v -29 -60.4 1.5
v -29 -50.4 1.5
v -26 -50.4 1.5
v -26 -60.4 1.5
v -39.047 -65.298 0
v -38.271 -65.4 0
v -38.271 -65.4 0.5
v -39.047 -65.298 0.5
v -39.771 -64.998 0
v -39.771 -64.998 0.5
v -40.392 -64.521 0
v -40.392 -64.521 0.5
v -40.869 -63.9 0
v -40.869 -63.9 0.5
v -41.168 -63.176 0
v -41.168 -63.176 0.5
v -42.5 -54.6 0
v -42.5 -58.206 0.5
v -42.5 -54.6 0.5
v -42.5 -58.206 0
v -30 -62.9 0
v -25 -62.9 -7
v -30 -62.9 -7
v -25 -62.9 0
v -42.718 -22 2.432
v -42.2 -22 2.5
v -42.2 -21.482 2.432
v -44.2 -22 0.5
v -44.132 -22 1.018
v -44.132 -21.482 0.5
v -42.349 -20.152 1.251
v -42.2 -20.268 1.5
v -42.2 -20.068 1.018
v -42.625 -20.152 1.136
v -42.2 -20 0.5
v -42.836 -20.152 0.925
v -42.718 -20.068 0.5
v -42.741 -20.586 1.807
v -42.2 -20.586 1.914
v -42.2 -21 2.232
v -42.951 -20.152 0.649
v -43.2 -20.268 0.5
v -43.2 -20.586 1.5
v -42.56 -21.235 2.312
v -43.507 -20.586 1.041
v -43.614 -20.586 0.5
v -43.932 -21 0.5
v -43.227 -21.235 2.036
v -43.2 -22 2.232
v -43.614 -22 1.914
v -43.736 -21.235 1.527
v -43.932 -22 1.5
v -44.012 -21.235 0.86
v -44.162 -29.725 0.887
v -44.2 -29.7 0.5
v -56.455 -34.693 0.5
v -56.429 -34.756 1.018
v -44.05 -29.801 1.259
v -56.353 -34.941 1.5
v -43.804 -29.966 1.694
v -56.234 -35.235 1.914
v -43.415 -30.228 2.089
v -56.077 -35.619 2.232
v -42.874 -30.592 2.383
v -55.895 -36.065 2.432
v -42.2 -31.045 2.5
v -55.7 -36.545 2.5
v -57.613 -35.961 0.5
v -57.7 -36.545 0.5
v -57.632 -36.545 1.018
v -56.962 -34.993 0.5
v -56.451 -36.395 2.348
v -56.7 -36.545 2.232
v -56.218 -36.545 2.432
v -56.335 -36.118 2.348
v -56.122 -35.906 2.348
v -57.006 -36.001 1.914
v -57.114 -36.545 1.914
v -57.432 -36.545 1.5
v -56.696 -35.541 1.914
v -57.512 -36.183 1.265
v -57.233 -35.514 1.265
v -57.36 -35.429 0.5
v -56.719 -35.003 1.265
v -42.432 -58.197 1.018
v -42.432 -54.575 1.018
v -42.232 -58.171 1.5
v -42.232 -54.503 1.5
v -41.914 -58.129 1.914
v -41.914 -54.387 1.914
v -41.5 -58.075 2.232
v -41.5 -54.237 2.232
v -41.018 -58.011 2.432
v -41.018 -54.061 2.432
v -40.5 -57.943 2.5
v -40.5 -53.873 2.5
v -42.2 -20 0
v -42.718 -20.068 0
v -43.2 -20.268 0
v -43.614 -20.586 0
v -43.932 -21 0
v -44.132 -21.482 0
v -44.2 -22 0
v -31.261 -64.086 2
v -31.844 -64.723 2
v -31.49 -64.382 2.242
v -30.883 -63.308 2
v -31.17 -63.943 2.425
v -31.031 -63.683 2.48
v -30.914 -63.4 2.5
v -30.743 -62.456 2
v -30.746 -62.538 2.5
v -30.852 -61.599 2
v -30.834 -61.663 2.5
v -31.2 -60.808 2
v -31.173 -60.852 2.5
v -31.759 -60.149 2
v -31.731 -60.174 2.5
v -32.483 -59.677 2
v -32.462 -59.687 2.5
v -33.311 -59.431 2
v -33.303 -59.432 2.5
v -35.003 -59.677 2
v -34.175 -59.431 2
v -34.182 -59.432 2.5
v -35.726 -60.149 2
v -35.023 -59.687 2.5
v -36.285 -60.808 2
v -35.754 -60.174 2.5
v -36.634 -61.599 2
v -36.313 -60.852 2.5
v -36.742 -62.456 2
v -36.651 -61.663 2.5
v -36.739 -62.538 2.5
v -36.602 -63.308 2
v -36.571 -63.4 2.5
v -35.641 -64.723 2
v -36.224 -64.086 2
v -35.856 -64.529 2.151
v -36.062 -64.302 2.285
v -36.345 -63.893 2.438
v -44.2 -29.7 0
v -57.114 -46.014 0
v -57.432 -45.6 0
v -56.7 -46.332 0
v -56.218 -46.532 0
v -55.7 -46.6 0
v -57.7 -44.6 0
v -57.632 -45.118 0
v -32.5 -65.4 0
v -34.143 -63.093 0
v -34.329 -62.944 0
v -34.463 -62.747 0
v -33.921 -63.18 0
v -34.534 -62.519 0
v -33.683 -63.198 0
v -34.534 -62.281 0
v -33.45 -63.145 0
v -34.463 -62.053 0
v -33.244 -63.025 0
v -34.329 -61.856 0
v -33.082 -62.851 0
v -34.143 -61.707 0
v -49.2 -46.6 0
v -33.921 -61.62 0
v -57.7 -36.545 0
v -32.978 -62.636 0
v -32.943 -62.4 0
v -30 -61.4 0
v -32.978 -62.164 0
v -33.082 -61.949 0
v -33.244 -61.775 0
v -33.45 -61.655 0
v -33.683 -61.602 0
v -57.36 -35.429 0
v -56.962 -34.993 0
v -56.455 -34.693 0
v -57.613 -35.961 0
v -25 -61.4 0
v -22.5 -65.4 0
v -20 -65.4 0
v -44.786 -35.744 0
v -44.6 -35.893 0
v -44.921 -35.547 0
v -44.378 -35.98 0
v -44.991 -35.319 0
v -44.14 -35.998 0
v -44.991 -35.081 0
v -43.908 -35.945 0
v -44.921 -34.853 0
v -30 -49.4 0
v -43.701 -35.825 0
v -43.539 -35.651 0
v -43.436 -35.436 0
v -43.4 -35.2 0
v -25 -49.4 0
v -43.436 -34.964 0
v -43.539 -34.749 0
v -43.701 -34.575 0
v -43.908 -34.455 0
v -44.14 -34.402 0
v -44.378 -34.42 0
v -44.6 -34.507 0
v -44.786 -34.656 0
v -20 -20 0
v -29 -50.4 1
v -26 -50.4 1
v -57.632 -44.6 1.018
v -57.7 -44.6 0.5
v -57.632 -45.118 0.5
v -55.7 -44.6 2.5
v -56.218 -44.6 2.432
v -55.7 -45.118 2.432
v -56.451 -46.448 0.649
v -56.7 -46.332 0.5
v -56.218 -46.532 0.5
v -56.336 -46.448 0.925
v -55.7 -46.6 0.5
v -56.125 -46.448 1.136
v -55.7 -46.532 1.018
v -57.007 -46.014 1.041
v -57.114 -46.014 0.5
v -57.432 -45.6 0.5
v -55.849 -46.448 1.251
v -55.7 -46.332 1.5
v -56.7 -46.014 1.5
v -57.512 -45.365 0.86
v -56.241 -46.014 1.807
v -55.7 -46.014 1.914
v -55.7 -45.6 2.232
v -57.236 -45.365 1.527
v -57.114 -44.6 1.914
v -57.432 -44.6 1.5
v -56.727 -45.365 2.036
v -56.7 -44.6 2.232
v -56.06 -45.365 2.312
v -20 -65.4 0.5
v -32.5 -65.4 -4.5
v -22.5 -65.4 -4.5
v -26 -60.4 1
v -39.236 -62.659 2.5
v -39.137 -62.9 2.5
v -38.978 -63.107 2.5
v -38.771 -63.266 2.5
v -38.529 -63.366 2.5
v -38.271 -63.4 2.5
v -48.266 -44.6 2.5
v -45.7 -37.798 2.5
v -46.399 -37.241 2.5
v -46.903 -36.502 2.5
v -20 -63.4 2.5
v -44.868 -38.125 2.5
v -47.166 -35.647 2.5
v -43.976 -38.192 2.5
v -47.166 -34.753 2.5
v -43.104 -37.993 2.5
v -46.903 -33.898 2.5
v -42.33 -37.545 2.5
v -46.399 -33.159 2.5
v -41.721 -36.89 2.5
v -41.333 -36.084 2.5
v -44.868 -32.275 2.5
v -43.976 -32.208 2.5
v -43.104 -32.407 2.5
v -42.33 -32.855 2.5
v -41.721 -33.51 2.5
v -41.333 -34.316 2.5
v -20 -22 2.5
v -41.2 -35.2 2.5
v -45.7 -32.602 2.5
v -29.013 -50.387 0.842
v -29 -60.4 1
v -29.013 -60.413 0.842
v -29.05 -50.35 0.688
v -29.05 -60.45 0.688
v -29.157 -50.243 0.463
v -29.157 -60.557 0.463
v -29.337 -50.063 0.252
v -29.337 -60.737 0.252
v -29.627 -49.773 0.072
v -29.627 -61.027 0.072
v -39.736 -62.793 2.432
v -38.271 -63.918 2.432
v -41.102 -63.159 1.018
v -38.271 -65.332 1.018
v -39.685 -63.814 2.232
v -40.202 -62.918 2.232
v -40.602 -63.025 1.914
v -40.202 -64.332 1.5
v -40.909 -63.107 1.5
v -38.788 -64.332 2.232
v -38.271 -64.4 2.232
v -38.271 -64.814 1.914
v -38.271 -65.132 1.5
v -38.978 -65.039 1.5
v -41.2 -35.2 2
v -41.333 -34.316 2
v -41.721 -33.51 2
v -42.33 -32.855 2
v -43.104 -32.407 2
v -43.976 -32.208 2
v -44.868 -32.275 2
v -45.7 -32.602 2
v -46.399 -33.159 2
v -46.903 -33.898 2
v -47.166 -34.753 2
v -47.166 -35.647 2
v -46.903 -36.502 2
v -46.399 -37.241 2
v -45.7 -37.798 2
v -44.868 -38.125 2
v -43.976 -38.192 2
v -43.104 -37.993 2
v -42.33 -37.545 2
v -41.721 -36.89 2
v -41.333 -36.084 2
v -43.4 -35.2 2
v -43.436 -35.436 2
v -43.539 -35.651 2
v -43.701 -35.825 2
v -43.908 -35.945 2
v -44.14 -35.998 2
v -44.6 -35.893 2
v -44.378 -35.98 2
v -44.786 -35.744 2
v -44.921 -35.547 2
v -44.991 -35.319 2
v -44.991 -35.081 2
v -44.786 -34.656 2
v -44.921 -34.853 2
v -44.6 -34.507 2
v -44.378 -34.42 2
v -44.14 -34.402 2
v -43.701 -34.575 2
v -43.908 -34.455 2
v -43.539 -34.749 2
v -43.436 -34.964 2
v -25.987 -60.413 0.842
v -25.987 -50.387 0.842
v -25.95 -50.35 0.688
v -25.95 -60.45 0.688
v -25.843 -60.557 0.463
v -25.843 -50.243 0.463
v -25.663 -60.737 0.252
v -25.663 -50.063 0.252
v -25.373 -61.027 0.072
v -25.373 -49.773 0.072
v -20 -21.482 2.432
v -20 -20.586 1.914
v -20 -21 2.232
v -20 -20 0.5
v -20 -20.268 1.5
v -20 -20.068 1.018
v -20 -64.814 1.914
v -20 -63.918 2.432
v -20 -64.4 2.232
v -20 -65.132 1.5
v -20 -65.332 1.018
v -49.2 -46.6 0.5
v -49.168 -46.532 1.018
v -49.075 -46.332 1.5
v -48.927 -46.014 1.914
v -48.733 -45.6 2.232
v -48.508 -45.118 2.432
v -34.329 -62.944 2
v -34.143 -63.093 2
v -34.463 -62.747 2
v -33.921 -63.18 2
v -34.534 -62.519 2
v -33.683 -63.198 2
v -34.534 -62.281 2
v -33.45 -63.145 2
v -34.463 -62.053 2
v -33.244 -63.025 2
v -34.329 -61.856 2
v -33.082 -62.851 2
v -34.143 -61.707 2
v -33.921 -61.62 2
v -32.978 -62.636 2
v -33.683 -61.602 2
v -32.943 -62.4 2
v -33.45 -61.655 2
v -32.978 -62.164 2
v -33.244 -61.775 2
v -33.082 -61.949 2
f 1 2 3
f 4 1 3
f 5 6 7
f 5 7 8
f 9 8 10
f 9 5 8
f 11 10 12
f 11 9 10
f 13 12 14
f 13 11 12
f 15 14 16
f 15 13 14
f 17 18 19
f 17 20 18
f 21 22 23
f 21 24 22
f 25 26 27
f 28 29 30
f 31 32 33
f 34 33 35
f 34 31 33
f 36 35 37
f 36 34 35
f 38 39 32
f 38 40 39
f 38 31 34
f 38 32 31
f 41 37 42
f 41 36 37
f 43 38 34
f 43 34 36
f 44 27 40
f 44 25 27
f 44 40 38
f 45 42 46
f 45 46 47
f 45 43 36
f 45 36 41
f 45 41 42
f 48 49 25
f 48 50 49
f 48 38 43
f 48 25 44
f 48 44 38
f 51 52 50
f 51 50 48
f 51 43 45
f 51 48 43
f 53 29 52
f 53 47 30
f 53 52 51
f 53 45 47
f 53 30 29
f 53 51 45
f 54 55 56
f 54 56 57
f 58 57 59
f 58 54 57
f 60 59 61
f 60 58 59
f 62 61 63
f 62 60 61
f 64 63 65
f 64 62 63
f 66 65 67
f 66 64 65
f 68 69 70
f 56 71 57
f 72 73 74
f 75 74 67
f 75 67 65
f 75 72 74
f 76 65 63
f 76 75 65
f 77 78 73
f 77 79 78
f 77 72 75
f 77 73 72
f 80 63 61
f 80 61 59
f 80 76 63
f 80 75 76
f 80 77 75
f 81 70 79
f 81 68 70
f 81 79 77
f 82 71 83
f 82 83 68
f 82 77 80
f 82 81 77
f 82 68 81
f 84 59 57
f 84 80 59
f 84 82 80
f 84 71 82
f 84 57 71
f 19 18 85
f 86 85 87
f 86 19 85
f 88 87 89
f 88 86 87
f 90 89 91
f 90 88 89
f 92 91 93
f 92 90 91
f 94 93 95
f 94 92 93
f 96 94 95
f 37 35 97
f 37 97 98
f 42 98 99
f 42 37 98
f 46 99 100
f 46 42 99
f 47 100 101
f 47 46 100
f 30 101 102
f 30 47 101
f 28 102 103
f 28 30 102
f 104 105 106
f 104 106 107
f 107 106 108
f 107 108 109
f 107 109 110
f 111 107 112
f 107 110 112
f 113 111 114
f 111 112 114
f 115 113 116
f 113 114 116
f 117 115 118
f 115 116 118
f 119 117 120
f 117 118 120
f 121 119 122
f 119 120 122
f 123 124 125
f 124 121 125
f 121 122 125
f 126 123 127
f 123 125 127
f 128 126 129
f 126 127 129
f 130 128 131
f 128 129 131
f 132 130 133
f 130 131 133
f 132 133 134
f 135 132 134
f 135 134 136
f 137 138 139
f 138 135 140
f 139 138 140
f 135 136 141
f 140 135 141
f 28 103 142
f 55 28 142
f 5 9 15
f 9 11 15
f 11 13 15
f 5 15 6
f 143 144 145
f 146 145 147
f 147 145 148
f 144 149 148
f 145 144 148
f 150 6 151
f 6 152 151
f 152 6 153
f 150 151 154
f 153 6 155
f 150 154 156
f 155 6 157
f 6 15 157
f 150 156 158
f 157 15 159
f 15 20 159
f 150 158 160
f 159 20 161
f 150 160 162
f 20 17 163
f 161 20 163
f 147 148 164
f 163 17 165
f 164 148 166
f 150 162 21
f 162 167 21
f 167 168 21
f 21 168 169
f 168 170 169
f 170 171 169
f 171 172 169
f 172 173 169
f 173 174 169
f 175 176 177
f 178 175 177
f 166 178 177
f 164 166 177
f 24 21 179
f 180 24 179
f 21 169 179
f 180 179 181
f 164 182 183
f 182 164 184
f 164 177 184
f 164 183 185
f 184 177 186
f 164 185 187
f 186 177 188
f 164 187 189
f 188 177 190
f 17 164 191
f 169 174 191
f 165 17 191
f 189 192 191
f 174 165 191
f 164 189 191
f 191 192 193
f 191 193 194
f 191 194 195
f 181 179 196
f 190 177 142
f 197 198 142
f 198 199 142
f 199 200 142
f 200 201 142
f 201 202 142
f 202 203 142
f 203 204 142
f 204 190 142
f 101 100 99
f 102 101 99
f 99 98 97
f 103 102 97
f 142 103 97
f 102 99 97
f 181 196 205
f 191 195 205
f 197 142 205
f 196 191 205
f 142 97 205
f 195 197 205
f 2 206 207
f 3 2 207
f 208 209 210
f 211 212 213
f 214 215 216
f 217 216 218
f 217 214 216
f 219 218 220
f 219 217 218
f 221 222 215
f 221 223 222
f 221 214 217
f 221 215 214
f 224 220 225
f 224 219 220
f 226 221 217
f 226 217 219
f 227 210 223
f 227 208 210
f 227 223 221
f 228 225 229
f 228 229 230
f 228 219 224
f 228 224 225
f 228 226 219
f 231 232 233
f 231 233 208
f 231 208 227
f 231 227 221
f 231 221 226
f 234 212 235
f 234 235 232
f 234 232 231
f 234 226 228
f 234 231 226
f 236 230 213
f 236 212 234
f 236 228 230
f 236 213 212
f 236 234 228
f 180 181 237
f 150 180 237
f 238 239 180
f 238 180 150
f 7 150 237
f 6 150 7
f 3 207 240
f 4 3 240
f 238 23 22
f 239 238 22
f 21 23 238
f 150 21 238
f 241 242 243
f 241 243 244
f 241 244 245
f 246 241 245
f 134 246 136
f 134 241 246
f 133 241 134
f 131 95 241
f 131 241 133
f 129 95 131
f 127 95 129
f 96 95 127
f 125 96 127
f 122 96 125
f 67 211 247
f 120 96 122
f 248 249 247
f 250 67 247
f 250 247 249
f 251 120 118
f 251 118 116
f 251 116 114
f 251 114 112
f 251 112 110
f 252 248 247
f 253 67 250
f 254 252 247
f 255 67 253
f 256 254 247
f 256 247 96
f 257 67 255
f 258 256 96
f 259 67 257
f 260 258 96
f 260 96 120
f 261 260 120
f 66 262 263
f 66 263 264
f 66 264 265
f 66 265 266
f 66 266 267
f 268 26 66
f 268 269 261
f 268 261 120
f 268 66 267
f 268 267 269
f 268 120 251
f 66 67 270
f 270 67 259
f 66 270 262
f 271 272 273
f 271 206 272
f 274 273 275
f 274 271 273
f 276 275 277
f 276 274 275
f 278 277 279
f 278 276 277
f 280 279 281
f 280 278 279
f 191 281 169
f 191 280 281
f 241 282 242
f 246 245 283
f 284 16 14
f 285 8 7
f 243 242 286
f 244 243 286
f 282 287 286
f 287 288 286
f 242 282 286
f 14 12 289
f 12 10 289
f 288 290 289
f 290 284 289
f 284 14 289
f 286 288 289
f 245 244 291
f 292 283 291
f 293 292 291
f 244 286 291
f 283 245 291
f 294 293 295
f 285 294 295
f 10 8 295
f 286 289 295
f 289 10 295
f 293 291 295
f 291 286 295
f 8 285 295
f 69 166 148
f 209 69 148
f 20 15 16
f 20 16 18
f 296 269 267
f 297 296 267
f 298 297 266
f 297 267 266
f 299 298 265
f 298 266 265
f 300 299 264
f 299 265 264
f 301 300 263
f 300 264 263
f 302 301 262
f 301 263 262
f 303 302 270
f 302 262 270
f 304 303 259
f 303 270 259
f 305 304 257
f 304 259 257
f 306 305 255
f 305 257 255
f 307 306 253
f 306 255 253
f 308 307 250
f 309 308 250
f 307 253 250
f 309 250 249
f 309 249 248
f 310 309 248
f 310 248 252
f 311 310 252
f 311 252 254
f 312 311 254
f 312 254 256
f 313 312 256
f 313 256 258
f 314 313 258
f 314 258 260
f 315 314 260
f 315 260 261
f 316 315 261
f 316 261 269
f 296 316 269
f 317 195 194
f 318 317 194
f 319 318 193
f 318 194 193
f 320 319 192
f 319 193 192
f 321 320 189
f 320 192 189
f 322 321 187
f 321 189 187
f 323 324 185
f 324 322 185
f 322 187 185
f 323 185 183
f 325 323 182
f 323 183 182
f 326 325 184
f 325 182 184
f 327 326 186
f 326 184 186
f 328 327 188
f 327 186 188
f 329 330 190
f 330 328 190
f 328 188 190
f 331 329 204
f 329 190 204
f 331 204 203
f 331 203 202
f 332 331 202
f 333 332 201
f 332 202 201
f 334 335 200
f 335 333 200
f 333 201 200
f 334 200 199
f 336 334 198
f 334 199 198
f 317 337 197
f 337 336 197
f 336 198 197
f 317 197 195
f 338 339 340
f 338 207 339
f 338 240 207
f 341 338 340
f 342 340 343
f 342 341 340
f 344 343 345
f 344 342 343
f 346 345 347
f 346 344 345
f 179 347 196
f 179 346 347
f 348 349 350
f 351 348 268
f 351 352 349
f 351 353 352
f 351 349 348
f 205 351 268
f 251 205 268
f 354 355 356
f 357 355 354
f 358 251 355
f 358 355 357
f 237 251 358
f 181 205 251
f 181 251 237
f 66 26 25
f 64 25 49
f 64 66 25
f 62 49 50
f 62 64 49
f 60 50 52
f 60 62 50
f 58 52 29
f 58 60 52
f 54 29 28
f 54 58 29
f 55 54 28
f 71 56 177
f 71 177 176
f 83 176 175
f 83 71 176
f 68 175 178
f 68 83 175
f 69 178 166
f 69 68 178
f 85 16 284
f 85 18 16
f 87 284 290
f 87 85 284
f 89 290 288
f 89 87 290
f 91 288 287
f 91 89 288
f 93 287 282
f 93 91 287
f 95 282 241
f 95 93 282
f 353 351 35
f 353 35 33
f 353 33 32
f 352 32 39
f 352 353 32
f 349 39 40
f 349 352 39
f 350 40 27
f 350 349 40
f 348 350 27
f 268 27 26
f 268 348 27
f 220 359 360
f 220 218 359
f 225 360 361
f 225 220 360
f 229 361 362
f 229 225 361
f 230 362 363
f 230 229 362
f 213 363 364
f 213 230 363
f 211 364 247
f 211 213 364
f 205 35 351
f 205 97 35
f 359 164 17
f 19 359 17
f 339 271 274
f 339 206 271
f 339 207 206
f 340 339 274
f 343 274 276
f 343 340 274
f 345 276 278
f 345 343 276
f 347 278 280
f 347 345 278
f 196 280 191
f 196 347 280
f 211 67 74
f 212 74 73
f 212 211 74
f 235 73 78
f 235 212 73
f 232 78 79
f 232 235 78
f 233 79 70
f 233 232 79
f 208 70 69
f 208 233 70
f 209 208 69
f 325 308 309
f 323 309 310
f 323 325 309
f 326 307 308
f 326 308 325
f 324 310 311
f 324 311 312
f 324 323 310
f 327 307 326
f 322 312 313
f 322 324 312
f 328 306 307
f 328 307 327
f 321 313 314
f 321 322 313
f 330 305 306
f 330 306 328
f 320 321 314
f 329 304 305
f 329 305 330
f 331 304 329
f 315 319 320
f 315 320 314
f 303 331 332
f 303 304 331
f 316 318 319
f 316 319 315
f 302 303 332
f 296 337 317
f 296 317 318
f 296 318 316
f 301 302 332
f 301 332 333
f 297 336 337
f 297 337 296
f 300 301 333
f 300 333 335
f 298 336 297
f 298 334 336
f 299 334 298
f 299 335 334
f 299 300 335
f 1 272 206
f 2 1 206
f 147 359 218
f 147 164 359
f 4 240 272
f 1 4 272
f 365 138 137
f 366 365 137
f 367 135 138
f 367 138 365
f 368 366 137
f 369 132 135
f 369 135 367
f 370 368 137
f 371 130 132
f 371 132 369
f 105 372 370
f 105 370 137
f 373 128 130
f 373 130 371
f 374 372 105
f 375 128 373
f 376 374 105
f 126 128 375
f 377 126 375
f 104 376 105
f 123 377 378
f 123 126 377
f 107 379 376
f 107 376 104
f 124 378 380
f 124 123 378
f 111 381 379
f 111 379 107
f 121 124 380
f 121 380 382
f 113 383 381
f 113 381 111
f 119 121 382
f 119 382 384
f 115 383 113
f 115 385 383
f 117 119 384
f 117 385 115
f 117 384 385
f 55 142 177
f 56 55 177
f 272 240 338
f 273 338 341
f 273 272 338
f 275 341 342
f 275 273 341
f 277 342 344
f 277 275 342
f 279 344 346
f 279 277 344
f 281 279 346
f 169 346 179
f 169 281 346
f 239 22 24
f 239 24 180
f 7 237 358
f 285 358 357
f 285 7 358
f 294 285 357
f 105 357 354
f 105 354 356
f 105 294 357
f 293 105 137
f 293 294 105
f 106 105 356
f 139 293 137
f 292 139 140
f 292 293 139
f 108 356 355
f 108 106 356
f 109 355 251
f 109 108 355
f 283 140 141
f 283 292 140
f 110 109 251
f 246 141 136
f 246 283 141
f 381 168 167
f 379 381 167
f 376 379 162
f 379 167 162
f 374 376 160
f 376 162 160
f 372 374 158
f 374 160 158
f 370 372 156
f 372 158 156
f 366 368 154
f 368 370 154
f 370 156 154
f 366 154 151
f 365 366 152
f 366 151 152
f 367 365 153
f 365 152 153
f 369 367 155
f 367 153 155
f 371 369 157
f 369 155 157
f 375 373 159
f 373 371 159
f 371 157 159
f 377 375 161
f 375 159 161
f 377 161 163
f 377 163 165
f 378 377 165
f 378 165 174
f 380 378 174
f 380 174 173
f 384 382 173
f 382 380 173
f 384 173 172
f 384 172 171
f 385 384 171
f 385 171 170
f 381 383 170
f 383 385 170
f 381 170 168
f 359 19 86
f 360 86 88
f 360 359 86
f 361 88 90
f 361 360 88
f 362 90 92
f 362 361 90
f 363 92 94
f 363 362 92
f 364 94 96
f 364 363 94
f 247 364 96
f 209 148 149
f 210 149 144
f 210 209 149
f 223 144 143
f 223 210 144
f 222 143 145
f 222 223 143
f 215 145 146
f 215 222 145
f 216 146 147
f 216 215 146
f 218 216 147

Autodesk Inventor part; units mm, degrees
ref_plane "YZ Plane" through (0, 0, 0) normal (1, 0, 0) x (0, 1, 0)
ref_plane "XZ Plane" through (0, 0, 0) normal (0, 1, 0) x (-1, 0, 0)
ref_plane "XY Plane" through (0, 0, 0) normal (0, 0, 1) x (1, 0, 0)
sketch "Эскиз1" plane through (0, 0, 0) normal (0, 0, 1) x (1, 0, 0)
  line L0 (-41.7, -37.7) -> (-41.7, -22.5)
  line L1 (-41.7, -22.5) -> (-37.5, -22.5)
  line L2 (-37.5, -22.5) -> (-37.5, -24.2)
  line L3 (-37.5, -24.2) -> (-27.2, -24.2)
  line L4 (-27.2, -24.2) -> (-27.2, -22.5)
  line L5 (-27.2, -22.5) -> (-25, -22.5)
  line L6 (-25, -22.5) -> (-25, -24.2)
  line L7 (-25, -24.2) -> (-22.5, -24.2)
  line L8 (-22.5, -24.2) -> (-22.5, -61.2)
  line L9 (-22.5, -61.2) -> (-25, -61.2)
  line L10 (-25, -61.2) -> (-25, -62.9)
  line L11 (-25, -62.9) -> (-40, -62.9)
  line L12 (-40, -62.9) -> (-40, -55.0851)
  line L13 (-44.2, -20) -> (-20, -20)
  line L14 (-20, -20) -> (-20, -65.4)
  line L15 (-60, -70) -> (-20, -70)
  line L16 (-20, -65.4) -> (-42.5, -65.4)
  line L17 (-41.7, -37.7) -> (-55.2, -37.7)
  line L18 (-44.2, -20) -> (-44.2, -29.7)
  line L19 (-55.2, -37.7) -> (-55.2, -44.1)
  line L20 (-44.2, -29.7) -> (-57.7, -35.2)
  line L21 (-57.7, -35.2) -> (-57.7, -46.6)
  line L22 (-60, -20) -> (-60, -70)
  line L23 (-42.5, -65.4) -> (-42.5, -54.6)
  line L24 (-55.2, -44.1) -> (-53.2, -44.1)
  line L25 (-53.2, -44.1) -> (-53.2, -46.6)
  line L26 (-53.2, -46.6) -> (-57.7, -46.6)
  line L27 (-49.2, -44.1) -> (-49.2, -46.6)
  line L28 (-49.2, -46.6) -> (-42.5, -54.6)
  line L29 (-49.2, -44.1) -> (-40, -55.0851)
  line L30 (-49.2, -44.1) -> (-46.2, -44.1)
  line L31 (-46.2, -44.1) -> (-46.2, -47.6821)
  line L32 (-25, -62.9) -> (-22.5, -65.4)
  line L33 (-30, -62.9) -> (-32.5, -65.4)
  line L34 (-46.2, -44.1) -> (-46.2, -37.7)
  line L35 (-20, -70) -> (-20, -20)
  line L36 (-20, -20) -> (-60, -20)
  line L37 (-53.2, -46.6) -> (-49.2, -46.6)
  line L38 (-53.2, -44.1) -> (-55.7, -46.6)
  line L39 (-49.2, -44.1) -> (-46.7, -49.5851)
  circle A0 centre (-54.1298, -30.506) radius 0.8
  circle A1 centre (-54.1298, -30.506) radius 3
  line L40 (-55.7762, -34.4162) -> (-56.908, -31.6379)
  line L41 (-50.2196, -32.1524) -> (-51.3515, -29.3742)
  circle A2 centre (-33.7426, -62.4) radius 0.8
  circle A3 centre (-33.7426, -62.4) radius 3
  line L42 (-29, -50.4) -> (-26, -50.4)
  line L43 (-26, -50.4) -> (-26, -60.4)
  line L44 (-26, -60.4) -> (-29, -60.4)
  line L45 (-29, -60.4) -> (-29, -50.4)
  circle A4 centre (-44.2, -35.2) radius 0.8
  circle A5 centre (-44.2, -35.2) radius 3
  line L46 (-40.5725, -65.4) -> (-42.5, -58.2063)
  point P0 (0, 0)
  point P1 (-44.2, -20)
  point P2 (-42.5417, -37.7)
  point P3 (-41.7, -36.8583)
  point P4 (-41.7, -33.5417)
  point P5 (-45.8583, -37.7)
  dimension "d0" = 16.7
  dimension "d1" = 4.2
  dimension "d2" = 2.2
  dimension "d3" = 1.7
  dimension "d4" = 40.4
  dimension "d5" = 1.7
  dimension "d6" = 2.5
  dimension "d7" = 15
  dimension "d8" = 2.5
  dimension "d9" = 2.5
  dimension "d10" = 2.5
  dimension "d11" = 15.2
  dimension "d12" = 2.5
  dimension "d14" = 2.5
  dimension "d15" = 2.5
  dimension "d16" = 8
  dimension "d17" = 2.5
  dimension "d18" = 6.4
  dimension "d19" = 2.5
  dimension "d20" = 2
  dimension "d21" = 4
  dimension "d22" = 2.5
  dimension "d23" = 3
  dimension "d24" = 5
  dimension "d25" = 2.5
  dimension "d26" = 8
  dimension "d27" = 2.5
  dimension "d28" = 2.5
  dimension "d29" = 2.5
  dimension "d30" = 20
  dimension "d31" = 20
  dimension "d32" = 50
  dimension "d33" = 40
  dimension "d44" = 37.7
  dimension "d55" = 1.6
  dimension "d57" = 6
  dimension "d58" = 6.5
  dimension "d60" = 1.6
  dimension "d61" = 6
  dimension "d66" = 6
  dimension "d67" = 9
  dimension "d68" = 5
  dimension "d69" = 15
  dimension "d77" = 1.6
  dimension "d78" = 6
  dimension "d80" = 15.2
  dimension "d81" = 24.2
  dimension "d83" = 15
  dimension "d84" = 1.2
extrude "Выдавливание1" add sketch "Эскиз1" along normal blind 2.5 contours L17 A5 L0 | L0 A5 L1 L2 L3 L4 L5 L6 L7 L8 L9 L10 L11 A3 L12 L29 L31 L34 L17 | A5 L17 L0 | L0 A5 | A5 L17 | A5 L17 L19 L24 L38 L26 L21 L20 L18 L13 L14 L16 L32 L10 L9 L8 L7 L6 L5 L4 L3 L2 L1 L0 | L34 L30 L27 L37 L25 L24 L19 L17 | L31 L29 L30 | L39 L28 L27 | L29 L12 L11 A3 L16 L46 L23 L28 L39 | L25 L26 L38 | A3 L11 A2 | L11 A2 A3 | A3 L33 L16 | L11 L33 A3 | L33 L11 L32 L16 | L42 L43 L44 L45
extrude "Выдавливание3" add sketch "Эскиз1" against normal blind 7 contours L33 L11 L32 L16
chamfer "Фаска1" distance 2.5 angle 45 1 edges at (-27.5, -65.4, -7)
fillet "Сопряжение1" radius 2 12 edges at (-44.2, -24.85, 2.5) (-50.95, -32.45, 2.5) (-57.7, -40.9, 2.5) (-53.45, -46.6, 2.5) (-45.85, -50.6, 2.5) (-42.5, -56.4032, 2.5) (-30.2862, -65.4, 2.5) (-57.7, -46.6, 1.25) (-57.7, -35.2, 1.25) (-32.1, -20, 2.5) (-44.2, -20, 1.25) (-41.5362, -61.8032, 2.5)
extrude "Выдавливание4" cut sketch "Эскиз1" against normal blind 0.5 from surface at 2.5 contours A5 L17 L0 | L0 A5 | A5 L17 | A3 L11 A2 | L11 A2 A3 picked at (-44.1679, -37.1314)
extrude "Выдавливание5" cut sketch "Эскиз1" along normal blind 1.5 contours L42 L43 L44 L45
fillet "Сопряжение3" radius 1 4 edges at (-29, -55.4, 0) (-27.5, -50.4, 0) (-26, -55.4, 0) (-27.5, -60.4, 0)
fillet "Сопряжение4" radius 3 2 edges at (-40.5725, -65.4, 0.25) (-40.123, -64.8142, 1.9142)
properties part number "Top_3DПЕЧАТЬ"
